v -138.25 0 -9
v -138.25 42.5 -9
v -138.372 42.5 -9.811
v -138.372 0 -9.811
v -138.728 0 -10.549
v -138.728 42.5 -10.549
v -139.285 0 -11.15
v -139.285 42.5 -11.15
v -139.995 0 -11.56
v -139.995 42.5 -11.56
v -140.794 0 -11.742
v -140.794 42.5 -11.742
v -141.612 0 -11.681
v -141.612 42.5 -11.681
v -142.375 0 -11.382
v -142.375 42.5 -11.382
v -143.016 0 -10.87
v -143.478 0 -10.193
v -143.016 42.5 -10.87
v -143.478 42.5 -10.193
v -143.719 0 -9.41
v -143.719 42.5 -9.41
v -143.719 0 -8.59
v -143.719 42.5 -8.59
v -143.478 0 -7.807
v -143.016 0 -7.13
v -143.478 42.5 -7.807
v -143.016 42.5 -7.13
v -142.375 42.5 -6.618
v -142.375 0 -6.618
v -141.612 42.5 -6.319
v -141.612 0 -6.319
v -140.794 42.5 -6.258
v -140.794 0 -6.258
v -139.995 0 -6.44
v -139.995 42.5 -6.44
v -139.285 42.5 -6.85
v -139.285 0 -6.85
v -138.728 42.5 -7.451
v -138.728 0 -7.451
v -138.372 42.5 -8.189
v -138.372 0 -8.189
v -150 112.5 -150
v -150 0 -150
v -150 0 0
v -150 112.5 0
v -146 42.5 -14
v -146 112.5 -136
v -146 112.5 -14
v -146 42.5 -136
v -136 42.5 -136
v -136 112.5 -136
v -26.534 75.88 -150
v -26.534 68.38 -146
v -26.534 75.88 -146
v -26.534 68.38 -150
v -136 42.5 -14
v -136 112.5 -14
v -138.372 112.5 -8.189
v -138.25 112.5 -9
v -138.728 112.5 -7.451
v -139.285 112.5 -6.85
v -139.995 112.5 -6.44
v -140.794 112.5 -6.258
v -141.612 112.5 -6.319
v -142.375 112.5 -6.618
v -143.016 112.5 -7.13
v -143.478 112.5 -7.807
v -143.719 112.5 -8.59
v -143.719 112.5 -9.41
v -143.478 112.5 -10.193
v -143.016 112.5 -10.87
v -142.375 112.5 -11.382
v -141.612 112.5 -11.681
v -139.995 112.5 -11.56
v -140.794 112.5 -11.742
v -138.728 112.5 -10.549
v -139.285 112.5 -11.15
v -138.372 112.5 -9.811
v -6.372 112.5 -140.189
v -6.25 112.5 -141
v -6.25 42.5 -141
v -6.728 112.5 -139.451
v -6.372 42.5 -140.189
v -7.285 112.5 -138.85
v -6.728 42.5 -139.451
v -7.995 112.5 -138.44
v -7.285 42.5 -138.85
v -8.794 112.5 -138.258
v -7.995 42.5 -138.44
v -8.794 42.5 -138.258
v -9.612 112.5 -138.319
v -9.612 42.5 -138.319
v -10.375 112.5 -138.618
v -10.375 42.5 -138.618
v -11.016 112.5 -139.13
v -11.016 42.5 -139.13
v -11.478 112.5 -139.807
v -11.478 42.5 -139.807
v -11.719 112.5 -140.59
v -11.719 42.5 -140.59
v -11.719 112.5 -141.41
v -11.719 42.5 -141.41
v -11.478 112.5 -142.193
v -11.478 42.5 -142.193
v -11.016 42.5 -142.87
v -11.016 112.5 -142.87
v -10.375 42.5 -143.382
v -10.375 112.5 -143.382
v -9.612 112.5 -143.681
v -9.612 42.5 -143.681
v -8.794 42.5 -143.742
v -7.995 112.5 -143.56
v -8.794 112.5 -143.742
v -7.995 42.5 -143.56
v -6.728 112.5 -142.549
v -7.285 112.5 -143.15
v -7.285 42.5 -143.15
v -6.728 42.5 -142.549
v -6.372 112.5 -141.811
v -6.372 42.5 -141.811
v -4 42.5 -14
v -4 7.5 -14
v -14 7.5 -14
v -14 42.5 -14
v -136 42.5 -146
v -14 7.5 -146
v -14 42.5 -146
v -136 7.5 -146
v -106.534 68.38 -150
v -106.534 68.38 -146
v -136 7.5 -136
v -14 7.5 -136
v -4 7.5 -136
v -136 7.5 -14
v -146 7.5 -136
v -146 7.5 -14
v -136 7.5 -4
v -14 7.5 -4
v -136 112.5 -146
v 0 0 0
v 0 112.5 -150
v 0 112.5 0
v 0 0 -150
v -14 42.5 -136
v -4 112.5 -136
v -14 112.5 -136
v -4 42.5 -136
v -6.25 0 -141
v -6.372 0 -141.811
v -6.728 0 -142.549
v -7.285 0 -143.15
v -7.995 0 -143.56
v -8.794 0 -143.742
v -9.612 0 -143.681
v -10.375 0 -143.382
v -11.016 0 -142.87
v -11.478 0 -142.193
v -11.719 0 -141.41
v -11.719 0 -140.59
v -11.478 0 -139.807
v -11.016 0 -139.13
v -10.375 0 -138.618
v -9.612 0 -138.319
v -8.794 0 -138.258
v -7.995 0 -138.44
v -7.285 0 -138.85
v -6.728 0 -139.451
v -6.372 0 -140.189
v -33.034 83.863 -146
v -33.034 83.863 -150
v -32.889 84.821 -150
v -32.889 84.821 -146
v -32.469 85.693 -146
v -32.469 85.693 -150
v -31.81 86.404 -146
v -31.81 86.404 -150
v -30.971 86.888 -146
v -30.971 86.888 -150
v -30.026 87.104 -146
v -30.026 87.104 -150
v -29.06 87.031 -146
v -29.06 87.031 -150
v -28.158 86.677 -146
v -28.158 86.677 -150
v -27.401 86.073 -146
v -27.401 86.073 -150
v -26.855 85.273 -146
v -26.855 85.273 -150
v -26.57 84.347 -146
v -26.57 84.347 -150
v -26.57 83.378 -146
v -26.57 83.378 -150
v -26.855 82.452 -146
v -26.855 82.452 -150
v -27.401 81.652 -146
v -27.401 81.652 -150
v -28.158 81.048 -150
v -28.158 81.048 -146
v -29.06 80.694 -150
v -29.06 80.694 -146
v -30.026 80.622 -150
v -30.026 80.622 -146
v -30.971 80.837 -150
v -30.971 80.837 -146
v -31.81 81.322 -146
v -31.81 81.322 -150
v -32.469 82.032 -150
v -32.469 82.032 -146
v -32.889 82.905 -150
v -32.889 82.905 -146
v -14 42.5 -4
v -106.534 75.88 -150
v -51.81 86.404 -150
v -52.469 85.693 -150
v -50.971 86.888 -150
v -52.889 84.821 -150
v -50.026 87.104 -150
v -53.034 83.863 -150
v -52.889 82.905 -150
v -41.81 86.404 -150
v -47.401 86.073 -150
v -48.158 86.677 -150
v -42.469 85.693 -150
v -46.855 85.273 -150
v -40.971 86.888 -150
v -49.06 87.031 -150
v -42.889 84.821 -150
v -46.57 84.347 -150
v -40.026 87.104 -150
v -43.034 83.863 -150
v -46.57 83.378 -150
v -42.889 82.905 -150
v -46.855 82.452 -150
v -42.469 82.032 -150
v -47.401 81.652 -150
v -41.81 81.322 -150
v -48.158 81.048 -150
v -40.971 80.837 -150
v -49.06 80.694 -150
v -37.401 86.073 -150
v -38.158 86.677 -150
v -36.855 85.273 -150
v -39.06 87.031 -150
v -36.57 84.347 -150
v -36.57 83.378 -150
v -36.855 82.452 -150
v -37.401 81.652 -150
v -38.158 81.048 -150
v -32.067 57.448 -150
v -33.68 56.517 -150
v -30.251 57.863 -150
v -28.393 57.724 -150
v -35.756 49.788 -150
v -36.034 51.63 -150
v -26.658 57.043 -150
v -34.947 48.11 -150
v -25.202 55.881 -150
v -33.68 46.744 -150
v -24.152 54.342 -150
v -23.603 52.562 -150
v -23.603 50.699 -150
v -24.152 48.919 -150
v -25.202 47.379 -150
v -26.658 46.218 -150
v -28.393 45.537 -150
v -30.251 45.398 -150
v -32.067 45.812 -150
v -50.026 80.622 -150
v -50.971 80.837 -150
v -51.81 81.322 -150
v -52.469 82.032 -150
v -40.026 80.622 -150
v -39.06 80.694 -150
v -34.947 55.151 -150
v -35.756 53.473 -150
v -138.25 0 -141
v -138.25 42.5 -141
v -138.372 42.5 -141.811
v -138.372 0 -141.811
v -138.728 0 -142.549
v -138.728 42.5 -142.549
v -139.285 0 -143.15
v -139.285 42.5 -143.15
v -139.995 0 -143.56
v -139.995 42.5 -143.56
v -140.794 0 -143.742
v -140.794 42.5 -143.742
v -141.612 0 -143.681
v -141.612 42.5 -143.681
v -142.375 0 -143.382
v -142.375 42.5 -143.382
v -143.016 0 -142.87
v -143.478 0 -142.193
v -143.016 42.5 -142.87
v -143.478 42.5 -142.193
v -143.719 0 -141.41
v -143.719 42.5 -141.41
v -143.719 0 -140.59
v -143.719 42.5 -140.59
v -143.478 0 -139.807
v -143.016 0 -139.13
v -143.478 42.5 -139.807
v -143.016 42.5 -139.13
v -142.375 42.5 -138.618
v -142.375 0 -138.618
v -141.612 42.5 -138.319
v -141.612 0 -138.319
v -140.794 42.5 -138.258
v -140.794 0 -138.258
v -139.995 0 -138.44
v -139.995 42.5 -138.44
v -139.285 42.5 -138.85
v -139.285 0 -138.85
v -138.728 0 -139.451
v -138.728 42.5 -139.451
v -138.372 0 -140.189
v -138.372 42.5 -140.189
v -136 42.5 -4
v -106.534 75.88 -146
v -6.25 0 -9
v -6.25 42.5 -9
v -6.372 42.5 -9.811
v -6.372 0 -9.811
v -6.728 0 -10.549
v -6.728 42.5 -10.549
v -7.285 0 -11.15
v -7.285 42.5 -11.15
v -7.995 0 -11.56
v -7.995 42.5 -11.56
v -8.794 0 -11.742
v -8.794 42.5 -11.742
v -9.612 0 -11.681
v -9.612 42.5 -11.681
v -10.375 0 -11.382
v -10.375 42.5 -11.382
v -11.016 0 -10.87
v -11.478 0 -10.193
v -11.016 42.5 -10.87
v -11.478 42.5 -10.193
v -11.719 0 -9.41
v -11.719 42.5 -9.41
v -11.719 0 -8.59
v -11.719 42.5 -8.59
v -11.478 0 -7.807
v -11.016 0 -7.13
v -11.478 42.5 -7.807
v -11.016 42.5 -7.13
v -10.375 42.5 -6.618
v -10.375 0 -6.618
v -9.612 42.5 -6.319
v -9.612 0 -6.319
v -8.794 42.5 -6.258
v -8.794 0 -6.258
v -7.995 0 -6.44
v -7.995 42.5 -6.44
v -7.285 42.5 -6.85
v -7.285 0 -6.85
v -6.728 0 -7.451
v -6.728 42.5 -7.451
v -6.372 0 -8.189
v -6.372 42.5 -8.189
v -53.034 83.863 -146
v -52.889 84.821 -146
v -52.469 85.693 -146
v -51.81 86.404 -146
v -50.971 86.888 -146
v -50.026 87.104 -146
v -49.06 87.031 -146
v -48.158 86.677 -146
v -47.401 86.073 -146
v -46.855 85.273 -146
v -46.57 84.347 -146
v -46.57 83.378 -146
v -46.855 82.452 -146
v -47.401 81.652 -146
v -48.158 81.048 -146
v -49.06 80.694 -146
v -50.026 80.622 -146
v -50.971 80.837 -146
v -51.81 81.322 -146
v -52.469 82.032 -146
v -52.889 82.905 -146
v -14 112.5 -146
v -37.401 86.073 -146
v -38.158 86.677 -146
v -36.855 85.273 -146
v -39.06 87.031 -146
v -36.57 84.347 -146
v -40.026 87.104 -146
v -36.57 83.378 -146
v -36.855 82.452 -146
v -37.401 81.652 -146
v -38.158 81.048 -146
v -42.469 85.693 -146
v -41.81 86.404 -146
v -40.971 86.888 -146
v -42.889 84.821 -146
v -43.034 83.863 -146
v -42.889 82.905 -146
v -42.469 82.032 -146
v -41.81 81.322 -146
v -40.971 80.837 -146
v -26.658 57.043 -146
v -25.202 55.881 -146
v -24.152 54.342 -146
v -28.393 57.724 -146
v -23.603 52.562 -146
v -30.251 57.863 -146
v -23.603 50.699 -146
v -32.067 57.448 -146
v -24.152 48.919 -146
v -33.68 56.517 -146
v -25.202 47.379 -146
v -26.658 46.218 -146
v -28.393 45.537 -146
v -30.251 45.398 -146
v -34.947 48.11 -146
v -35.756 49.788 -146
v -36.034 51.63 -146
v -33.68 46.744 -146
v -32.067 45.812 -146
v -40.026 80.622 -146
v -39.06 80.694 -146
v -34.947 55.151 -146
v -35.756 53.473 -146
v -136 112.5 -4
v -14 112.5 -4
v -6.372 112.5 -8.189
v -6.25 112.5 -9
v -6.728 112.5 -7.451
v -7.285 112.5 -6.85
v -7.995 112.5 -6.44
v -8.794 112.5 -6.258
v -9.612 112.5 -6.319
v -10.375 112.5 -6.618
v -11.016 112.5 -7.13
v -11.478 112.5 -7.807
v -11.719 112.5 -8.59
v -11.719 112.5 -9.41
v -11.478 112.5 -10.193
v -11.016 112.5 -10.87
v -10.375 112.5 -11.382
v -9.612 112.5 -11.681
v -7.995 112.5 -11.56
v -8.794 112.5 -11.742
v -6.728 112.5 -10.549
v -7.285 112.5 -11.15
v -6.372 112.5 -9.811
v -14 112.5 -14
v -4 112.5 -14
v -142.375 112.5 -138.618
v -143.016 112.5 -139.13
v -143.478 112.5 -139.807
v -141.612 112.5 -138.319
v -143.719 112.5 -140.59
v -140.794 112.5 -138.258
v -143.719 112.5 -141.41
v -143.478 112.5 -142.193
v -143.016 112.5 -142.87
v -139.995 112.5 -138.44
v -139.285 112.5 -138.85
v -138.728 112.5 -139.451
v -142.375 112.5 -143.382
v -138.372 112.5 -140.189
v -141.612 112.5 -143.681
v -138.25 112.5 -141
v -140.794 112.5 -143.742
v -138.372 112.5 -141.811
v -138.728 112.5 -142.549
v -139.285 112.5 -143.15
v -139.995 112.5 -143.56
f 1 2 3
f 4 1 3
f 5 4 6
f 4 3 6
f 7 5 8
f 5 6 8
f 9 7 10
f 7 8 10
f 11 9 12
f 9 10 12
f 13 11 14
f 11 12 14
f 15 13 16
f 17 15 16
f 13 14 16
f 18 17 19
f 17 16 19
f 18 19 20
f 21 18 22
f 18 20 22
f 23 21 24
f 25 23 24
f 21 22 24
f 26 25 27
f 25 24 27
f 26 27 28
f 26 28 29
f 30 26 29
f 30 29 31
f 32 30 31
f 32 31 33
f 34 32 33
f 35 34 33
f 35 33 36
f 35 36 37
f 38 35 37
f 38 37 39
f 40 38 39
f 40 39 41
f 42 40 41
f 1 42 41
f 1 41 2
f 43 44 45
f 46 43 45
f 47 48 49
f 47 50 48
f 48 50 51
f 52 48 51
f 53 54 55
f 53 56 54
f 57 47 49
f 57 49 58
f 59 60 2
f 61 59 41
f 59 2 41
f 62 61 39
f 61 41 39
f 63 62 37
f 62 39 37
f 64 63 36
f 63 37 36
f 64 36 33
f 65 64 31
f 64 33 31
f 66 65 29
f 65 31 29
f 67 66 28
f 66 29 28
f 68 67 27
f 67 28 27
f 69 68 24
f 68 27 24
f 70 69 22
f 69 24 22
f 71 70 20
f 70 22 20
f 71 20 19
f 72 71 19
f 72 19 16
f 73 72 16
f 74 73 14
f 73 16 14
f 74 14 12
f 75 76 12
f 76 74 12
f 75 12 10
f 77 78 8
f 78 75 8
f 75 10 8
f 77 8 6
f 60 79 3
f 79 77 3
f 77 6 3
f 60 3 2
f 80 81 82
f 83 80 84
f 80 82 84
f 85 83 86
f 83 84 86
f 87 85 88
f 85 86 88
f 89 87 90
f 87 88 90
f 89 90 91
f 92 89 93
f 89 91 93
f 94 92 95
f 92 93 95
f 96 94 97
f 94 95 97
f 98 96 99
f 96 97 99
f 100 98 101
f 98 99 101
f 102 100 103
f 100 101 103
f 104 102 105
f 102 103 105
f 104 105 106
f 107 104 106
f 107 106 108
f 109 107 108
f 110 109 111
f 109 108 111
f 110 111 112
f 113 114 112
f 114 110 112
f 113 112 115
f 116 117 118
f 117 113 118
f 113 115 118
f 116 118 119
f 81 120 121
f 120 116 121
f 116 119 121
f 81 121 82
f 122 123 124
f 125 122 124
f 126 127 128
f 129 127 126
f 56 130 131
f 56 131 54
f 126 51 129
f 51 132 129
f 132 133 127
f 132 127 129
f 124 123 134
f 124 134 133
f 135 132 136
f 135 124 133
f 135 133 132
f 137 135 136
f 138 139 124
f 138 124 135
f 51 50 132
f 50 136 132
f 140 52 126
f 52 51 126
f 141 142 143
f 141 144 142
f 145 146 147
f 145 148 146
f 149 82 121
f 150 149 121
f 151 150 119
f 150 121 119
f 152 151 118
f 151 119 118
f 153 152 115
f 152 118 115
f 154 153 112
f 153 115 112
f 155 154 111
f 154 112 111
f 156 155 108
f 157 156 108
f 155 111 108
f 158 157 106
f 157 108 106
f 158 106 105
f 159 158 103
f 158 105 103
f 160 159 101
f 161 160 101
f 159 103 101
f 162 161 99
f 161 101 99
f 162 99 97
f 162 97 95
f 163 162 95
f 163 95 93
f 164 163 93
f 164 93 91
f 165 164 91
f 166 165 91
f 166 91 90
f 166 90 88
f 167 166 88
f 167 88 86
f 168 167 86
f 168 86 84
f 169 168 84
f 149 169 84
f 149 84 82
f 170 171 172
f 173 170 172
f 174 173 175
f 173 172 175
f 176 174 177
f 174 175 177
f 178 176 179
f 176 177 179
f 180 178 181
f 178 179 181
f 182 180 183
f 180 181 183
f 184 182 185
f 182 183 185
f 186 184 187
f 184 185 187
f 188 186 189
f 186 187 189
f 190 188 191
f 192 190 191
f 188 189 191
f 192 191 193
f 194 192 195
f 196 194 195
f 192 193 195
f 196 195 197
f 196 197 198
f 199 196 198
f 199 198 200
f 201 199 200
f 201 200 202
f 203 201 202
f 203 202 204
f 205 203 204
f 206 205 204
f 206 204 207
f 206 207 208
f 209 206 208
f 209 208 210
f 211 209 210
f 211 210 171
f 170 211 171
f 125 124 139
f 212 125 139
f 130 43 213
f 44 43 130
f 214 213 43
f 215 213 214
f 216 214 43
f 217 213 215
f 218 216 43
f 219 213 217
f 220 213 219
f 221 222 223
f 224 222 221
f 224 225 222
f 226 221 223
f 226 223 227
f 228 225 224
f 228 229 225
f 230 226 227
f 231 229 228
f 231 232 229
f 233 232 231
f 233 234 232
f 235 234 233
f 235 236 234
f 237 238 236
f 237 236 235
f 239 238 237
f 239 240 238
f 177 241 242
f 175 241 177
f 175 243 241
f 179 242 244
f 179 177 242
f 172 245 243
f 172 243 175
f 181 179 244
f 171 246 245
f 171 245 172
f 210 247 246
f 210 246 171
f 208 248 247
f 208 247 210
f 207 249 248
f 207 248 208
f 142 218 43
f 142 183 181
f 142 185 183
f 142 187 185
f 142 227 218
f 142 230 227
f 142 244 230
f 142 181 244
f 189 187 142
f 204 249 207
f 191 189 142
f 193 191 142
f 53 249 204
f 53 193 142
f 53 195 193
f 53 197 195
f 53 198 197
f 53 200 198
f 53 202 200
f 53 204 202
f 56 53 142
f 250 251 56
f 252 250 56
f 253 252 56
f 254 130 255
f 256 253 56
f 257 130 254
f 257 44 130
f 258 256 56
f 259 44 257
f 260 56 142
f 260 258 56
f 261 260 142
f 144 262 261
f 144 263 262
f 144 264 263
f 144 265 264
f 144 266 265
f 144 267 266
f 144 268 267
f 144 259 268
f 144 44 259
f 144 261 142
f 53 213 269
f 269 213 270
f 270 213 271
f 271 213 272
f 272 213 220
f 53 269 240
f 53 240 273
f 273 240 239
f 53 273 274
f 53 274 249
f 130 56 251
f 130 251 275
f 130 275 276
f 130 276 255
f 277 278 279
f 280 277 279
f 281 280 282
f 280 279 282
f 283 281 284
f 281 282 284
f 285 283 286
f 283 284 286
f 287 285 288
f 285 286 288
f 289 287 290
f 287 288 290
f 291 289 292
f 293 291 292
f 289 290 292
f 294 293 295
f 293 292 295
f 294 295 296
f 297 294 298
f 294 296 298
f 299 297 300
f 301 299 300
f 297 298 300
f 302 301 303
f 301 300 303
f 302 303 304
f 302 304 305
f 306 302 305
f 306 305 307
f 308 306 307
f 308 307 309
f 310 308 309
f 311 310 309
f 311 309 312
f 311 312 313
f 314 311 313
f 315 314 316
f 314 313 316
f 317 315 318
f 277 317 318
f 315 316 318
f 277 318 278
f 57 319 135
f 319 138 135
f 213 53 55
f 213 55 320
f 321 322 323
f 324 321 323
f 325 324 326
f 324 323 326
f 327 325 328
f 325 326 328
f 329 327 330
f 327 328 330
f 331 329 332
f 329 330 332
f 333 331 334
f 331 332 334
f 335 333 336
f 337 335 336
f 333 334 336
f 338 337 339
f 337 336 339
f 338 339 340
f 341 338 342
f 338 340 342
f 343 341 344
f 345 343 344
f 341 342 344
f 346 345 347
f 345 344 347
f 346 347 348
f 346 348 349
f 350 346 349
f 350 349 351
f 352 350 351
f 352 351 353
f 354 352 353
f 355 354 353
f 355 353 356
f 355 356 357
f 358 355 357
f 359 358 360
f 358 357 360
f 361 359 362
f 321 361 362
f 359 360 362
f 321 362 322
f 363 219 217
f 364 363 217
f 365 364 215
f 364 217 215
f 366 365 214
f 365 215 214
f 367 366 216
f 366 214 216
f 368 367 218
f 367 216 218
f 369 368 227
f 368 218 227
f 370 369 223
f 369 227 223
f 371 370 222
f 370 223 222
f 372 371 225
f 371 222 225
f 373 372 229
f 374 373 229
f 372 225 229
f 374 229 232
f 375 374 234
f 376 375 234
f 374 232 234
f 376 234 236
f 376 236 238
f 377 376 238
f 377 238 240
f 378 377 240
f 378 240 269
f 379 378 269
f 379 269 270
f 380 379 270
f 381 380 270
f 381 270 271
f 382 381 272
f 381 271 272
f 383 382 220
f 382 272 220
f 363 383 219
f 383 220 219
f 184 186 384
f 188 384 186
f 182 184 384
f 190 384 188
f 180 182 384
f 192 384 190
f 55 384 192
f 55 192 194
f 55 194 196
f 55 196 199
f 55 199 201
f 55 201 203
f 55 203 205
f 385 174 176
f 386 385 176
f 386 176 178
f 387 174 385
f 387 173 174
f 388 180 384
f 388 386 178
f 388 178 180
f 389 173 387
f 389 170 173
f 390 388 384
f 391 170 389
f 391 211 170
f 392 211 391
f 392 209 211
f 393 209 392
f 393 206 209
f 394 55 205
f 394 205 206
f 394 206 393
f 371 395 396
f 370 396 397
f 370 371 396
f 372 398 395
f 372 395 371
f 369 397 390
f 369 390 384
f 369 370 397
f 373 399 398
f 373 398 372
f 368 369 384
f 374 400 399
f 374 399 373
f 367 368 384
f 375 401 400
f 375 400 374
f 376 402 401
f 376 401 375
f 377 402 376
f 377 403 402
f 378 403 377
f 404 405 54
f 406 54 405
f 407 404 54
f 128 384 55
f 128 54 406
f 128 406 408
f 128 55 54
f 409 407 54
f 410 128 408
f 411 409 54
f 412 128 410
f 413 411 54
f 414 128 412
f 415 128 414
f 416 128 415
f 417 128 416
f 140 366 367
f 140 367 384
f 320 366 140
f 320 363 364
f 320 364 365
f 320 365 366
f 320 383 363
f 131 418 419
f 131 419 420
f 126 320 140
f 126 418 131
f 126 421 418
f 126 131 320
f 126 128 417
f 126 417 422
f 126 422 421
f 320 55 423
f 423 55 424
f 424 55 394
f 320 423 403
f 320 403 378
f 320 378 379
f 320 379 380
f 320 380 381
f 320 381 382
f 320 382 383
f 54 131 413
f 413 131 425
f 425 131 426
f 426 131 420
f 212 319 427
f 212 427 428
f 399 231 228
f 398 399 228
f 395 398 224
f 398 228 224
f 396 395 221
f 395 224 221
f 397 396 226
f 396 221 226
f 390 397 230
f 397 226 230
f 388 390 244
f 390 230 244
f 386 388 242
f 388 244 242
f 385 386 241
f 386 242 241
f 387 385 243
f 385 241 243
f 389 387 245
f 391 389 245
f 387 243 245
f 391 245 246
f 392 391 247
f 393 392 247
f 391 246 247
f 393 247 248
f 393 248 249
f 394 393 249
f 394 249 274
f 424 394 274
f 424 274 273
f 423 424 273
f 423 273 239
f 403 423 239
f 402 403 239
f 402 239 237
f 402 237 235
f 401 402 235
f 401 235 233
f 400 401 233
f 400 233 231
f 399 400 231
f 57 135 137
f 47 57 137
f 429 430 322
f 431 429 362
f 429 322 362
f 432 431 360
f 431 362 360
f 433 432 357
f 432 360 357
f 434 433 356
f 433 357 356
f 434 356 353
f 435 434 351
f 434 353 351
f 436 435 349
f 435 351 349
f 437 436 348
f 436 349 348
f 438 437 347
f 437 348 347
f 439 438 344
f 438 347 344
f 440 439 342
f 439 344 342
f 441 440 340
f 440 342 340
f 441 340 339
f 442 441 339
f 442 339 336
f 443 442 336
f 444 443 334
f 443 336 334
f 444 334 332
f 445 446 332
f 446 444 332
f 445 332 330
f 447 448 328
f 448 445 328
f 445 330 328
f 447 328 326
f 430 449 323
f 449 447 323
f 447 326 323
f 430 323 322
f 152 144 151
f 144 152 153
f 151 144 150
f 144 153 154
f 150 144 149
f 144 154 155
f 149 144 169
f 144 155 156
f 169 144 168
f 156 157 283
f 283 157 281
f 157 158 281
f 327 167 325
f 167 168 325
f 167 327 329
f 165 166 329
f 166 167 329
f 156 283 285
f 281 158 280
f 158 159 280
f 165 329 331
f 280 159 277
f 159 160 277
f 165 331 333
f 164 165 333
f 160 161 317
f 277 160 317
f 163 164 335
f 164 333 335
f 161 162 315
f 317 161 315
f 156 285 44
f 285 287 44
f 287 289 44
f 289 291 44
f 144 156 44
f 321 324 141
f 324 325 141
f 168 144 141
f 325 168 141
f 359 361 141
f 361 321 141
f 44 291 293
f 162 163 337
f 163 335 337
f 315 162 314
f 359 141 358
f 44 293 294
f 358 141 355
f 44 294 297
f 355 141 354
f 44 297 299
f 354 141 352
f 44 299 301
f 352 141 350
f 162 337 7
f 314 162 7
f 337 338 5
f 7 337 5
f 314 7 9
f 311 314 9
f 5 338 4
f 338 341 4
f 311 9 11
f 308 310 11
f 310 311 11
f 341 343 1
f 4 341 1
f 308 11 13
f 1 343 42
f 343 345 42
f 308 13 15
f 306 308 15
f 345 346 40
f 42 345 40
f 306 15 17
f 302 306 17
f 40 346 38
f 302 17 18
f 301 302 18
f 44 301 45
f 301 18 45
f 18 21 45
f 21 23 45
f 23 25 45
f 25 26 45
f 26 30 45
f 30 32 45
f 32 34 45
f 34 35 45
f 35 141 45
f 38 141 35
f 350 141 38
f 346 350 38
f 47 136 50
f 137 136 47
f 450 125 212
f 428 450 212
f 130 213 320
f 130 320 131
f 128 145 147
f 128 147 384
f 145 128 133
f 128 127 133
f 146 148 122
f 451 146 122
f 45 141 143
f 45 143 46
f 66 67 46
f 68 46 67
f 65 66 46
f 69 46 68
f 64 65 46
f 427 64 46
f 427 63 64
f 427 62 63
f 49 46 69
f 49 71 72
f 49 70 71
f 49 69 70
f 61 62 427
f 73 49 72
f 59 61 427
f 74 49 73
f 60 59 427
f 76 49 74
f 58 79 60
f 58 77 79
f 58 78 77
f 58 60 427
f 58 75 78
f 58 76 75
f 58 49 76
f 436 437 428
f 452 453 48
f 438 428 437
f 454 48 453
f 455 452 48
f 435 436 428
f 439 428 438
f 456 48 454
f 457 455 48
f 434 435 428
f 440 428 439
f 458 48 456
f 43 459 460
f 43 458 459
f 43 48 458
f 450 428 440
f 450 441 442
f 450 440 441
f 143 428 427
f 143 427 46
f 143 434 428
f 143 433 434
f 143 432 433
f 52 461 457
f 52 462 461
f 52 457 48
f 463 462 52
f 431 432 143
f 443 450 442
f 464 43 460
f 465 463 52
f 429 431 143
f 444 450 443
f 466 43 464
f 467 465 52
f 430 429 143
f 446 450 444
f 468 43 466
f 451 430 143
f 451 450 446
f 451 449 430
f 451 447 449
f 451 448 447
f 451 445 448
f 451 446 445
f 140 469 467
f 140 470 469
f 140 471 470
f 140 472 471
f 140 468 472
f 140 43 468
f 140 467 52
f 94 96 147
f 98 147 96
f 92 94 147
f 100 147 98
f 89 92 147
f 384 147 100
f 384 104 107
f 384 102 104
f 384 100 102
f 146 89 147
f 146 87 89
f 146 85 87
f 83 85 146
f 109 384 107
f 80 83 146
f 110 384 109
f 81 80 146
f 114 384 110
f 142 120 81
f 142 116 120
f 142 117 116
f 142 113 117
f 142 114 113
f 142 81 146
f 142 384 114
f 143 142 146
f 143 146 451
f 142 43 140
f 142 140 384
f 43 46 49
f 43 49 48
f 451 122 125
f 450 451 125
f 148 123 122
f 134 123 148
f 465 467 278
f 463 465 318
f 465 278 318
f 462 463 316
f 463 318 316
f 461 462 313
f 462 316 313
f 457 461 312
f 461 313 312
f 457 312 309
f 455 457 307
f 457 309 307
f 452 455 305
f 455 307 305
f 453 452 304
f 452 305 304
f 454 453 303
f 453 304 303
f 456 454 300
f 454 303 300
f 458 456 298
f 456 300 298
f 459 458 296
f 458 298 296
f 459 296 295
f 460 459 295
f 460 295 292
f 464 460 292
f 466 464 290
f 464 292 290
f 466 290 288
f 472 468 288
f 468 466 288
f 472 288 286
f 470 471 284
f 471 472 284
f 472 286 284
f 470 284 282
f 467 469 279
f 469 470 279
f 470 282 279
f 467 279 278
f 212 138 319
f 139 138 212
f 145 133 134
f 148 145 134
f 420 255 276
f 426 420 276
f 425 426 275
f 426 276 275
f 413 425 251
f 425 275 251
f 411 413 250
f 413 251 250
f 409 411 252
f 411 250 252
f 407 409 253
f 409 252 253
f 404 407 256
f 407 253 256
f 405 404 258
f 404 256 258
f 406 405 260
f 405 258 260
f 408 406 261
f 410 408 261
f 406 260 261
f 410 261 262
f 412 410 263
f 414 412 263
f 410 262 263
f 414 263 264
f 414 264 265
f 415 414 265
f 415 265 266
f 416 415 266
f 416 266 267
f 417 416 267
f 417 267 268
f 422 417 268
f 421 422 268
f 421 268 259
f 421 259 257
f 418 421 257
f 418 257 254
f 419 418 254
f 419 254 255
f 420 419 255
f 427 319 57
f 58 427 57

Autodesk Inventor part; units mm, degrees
ref_plane "YZ Plane" through (0, 0, 0) normal (1, 0, 0) x (0, 1, 0)
ref_plane "XZ Plane" through (0, 0, 0) normal (0, 1, 0) x (-1, 0, 0)
ref_plane "XY Plane" through (0, 0, 0) normal (0, 0, 1) x (1, 0, 0)
sketch "Sketch1" plane through (0, 0, 0) normal (0, 1, 0) x (-1, 0, 0)
  point P0 (0, 0)
sketch "Sketch2" plane through (0, 0, 0) normal (0, 1, 0) x (-1, 0, 0)
  line L0 (0, 0) -> (150, 0)
  line L1 (150, 0) -> (150, -150)
  line L2 (150, -150) -> (0, -150)
  line L3 (0, -150) -> (0, 0)
  dimension "d0" = 150
  dimension "d1" = 150
extrude "Extrusion1" add sketch "Sketch2" along normal blind 7.5
sketch "Sketch4" plane through (0, 7.5, 0) normal (0, 1, 0) x (1, 0, 0)
  line L0 (0, 0) -> (-150, 0) projected
  line L1 (0, 150) -> (0, 0) projected
  line L2 (-150, 0) -> (0, 0)
  line L3 (0, 0) -> (0, 150)
  line L4 (0, 150) -> (-150, 150)
  line L5 (-150, 150) -> (-150, 0)
  line L6 (-146, 4) -> (-4, 4)
  line L7 (-4, 4) -> (-4, 146)
  line L8 (-4, 146) -> (-146, 146)
  line L9 (-146, 146) -> (-146, 4)
  dimension "d7" = 4
extrude "Extrusion3" add sketch "Sketch4" along normal blind 35
sketch "Sketch5" plane through (0, 7.5, 0) normal (0, 1, 0) x (1, 0, 0)
  line L0 (-146, 146) -> (-146, 4) projected
  line L1 (-146, 4) -> (-136, 4)
  line L2 (-136, 4) -> (-136, 14)
  line L3 (-136, 14) -> (-146, 14)
  line L4 (-146, 14) -> (-146, 4)
  point P0 (0, 0)
  dimension "d10" = 10
  dimension "d11" = 10
extrude "Extrusion4" add sketch "Sketch5" along normal blind 35
pattern_linear "Rectangular Pattern1" count 2 spacing 132 along (0, 0, -1) count 2 spacing 132 along (1, 0, 0) of "Extrusion4"
sketch "Sketch6" plane through (0, 42.5, 0) normal (0, 1, 0) x (1, 0, 0)
  line L0 (-136, 14) -> (-146, 14) projected
  line L1 (-141, 14) -> (-141, 0)
  line L2 (0, 0) -> (-150, 0) projected
  circle A0 centre (-141, 9) radius 2.75
  dimension "d20" = 5.5
extrude "Extrusion5" cut sketch "Sketch6" against normal blind 80
pattern_linear "Rectangular Pattern2" count 2 spacing 132 along (0, 0, -1) count 2 spacing 132 along (1, 0, 0) of "Extrusion5"
sketch "Sketch9" plane through (0, 42.5, 0) normal (0, 1, 0) x (1, 0, 0)
  point P0 (0, 0)
sketch "Sketch10" plane through (0, 42.5, 0) normal (0, 1, 0) x (1, 0, 0)
  line L0 (0, 0) -> (-150, 0) projected
  line L1 (-150, 150) -> (-150, 0) projected
  line L2 (0, 0) -> (-150, 0)
  line L3 (-150, 0) -> (-150, 150)
  line L4 (-150, 150) -> (0, 150)
  line L5 (0, 150) -> (0, 0)
  line L6 (-136, 4) -> (-14, 4) projected
  line L7 (-14, 4) -> (-136, 4)
  line L8 (-136, 4) -> (-136, 14) projected
  line L9 (-136, 4) -> (-136, 14)
  line L10 (-146, 14) -> (-136, 14) projected
  line L11 (-136, 14) -> (-146, 14)
  line L12 (-146, 136) -> (-146, 14) projected
  line L13 (-146, 14) -> (-146, 136)
  line L14 (-146, 136) -> (-136, 136)
  line L15 (-14, 146) -> (-136, 146) projected
  line L16 (-136, 136) -> (-136, 146)
  line L17 (-14, 136) -> (-14, 146) projected
  line L18 (-136, 146) -> (-14, 146)
  line L19 (-14, 146) -> (-14, 136)
  line L20 (-4, 136) -> (-14, 136) projected
  line L21 (-14, 136) -> (-4, 136)
  line L22 (-4, 136) -> (-4, 14)
  line L23 (-4, 14) -> (-14, 14) projected
  line L24 (-4, 14) -> (-14, 14)
  line L25 (-14, 14) -> (-14, 4) projected
  line L26 (-14, 14) -> (-14, 4)
  circle A0 centre (-9, 9) radius 2.75
  circle A1 centre (-141, 9) radius 2.75
  circle A2 centre (-141, 141) radius 2.75 projected
  circle A3 centre (-141, 141) radius 2.75
  circle A4 centre (-9, 141) radius 2.75 projected
  circle A5 centre (-9, 141) radius 2.75
extrude "Extrusion8" add sketch "Sketch10" along normal blind 70
sketch "Sketch11" plane through (0, 0, -150) normal (0, 0, -1) x (-1, 0, 0)
  point P0 (0, 0)
sketch "Sketch12" plane through (0, 0, -150) normal (0, 0, -1) x (-1, 0, 0)
  circle A0 centre (29.7835, 83.8626) radius 3.25
  point P0 (0, 0)
  dimension "d47" = 6.5
extrude "Extrusion9" cut sketch "Sketch12" against normal blind 70
pattern_linear "Rectangular Pattern5" count 3 spacing 10 along (-1, 0, 0) of "Extrusion9"
sketch "Sketch13" plane through (0, 0, -150) normal (0, 0, -1) x (-1, 0, 0)
  line L0 (26.5335, 75.8795) -> (106.5335, 75.8795)
  line L1 (106.5335, 75.8795) -> (106.5335, 68.3795)
  line L2 (106.5335, 68.3795) -> (26.5335, 68.3795)
  line L3 (26.5335, 68.3795) -> (26.5335, 75.8795)
  point P0 (0, 0)
  dimension "d53" = 80
  dimension "d54" = 7.5
extrude "Extrusion10" cut sketch "Sketch13" against normal blind 70
sketch "Sketch14" plane through (-136, 7.5, -146) normal (0, 0, 1) x (1, 0, 0)
  point P0 (136, -7.5)
sketch "Sketch15" plane through (-136, 7.5, -146) normal (0, 0, 1) x (1, 0, 0)
  point P0 (136, -7.5)
sketch "Sketch16" plane through (0, 0, -150) normal (0, 0, -1) x (-1, 0, 0)
  circle A0 centre (29.7835, 51.6304) radius 6.25
  point P0 (0, 0)
  dimension "d57" = 12.5
extrude "Extrusion11" cut sketch "Sketch16" against normal blind 70
properties part number "Bottom"
